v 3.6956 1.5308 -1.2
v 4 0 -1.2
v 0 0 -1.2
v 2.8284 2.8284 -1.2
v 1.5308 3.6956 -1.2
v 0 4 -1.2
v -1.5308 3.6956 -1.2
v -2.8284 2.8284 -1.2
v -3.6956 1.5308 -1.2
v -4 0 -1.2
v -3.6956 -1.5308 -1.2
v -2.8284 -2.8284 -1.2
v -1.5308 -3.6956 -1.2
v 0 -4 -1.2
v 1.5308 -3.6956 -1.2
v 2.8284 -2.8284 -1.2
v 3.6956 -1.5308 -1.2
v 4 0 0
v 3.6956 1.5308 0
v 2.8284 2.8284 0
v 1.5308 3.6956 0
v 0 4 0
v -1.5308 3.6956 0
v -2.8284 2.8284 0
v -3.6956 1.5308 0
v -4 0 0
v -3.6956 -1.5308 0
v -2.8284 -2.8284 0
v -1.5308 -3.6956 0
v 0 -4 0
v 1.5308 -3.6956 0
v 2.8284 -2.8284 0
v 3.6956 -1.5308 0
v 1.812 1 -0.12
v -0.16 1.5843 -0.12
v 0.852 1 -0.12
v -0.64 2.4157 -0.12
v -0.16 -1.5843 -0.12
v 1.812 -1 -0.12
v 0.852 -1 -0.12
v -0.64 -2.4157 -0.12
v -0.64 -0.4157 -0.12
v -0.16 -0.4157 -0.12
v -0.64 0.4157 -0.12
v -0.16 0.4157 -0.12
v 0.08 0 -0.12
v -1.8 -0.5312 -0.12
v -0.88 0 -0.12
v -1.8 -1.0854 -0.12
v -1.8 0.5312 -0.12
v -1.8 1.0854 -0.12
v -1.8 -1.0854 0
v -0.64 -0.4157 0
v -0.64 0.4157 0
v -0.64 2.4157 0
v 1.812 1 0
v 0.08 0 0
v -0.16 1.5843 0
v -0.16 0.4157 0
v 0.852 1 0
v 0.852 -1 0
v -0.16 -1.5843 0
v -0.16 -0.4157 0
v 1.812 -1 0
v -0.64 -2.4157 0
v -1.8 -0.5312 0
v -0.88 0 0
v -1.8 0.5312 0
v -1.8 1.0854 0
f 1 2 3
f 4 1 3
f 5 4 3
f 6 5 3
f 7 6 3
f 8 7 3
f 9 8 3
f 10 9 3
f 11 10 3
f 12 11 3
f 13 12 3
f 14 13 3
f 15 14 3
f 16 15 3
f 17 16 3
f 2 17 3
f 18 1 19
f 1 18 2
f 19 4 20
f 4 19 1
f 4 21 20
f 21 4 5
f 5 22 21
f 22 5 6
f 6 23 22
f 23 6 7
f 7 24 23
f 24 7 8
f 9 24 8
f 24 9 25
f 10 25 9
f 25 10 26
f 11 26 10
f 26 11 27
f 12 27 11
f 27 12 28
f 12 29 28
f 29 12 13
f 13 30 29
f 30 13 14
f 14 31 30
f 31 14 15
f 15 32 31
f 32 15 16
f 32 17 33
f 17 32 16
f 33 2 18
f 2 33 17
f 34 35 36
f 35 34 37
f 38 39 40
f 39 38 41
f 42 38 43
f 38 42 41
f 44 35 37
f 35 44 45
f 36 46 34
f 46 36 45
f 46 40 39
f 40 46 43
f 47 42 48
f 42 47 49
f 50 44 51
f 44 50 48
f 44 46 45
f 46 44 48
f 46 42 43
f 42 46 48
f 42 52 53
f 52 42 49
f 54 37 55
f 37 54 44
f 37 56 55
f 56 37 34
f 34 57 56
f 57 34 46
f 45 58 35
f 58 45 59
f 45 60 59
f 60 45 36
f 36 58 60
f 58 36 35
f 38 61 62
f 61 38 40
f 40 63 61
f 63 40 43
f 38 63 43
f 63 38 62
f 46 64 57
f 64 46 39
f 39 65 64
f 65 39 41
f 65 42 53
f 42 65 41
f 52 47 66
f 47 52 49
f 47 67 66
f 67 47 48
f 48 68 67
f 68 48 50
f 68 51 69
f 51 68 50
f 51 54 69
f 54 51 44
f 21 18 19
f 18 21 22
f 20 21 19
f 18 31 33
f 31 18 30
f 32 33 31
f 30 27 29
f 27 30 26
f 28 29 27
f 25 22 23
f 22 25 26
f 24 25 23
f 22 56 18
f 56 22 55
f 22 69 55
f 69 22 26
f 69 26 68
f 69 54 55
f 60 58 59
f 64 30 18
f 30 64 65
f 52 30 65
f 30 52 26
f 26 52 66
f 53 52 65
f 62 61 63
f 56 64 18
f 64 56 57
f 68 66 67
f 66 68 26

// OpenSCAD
// file: ../p/4-4edge.scad
use <../lib.scad>
function ldraw_lib__4_4edge() = [
// 0 Circle 1.0
// 0 Name: 4-4edge.dat
// 0 Author: James Jessiman
// 0 !LDRAW_ORG Primitive UPDATE 2017-01
// 0 !LICENSE Licensed under CC BY 2.0 and CC BY 4.0 : see CAreadme.txt
// 
// 0 BFC CERTIFY CCW
  [0,"BFC","CERTIFY"],
  [0,"BFC","CCW"],
// 
// 0 !HISTORY 1998-12-15 [PTadmin] Official Update 1998-10
// 0 !HISTORY 2005-12-28 [PTadmin] Official Update 2005-01
// 0 !HISTORY 2007-06-24 [PTadmin] Header formatted for Contributor Agreement
// 0 !HISTORY 2008-07-01 [PTadmin] Official Update 2008-01
// 0 !HISTORY 2017-01-15 [Steffen] BFCed
// 0 !HISTORY 2017-12-30 [PTadmin] Official Update 2017-01
// 
// 
// 2 24 1 0 0 0.9239 0 0.3827
  [2,24,1,0,0,0.9239,0,0.3827],
// 2 24 0.9239 0 0.3827 0.7071 0 0.7071
  [2,24,0.9239,0,0.3827,0.7071,0,0.7071],
// 2 24 0.7071 0 0.7071 0.3827 0 0.9239
  [2,24,0.7071,0,0.7071,0.3827,0,0.9239],
// 2 24 0.3827 0 0.9239 0 0 1
  [2,24,0.3827,0,0.9239,0,0,1],
// 2 24 0 0 1 -0.3827 0 0.9239
  [2,24,0,0,1,-0.3827,0,0.9239],
// 2 24 -0.3827 0 0.9239 -0.7071 0 0.7071
  [2,24,-0.3827,0,0.9239,-0.7071,0,0.7071],
// 2 24 -0.7071 0 0.7071 -0.9239 0 0.3827
  [2,24,-0.7071,0,0.7071,-0.9239,0,0.3827],
// 2 24 -0.9239 0 0.3827 -1 0 -0
  [2,24,-0.9239,0,0.3827,-1,0,-0],
// 2 24 -1 0 -0 -0.9239 0 -0.3827
  [2,24,-1,0,-0,-0.9239,0,-0.3827],
// 2 24 -0.9239 0 -0.3827 -0.7071 0 -0.7071
  [2,24,-0.9239,0,-0.3827,-0.7071,0,-0.7071],
// 2 24 -0.7071 0 -0.7071 -0.3827 0 -0.9239
  [2,24,-0.7071,0,-0.7071,-0.3827,0,-0.9239],
// 2 24 -0.3827 0 -0.9239 0 0 -1
  [2,24,-0.3827,0,-0.9239,0,0,-1],
// 2 24 0 0 -1 0.3827 0 -0.9239
  [2,24,0,0,-1,0.3827,0,-0.9239],
// 2 24 0.3827 0 -0.9239 0.7071 0 -0.7071
  [2,24,0.3827,0,-0.9239,0.7071,0,-0.7071],
// 2 24 0.7071 0 -0.7071 0.9239 0 -0.3827
  [2,24,0.7071,0,-0.7071,0.9239,0,-0.3827],
// 2 24 0.9239 0 -0.3827 1 0 0
  [2,24,0.9239,0,-0.3827,1,0,0],
];
makepoly(ldraw_lib__4_4edge(), line=0.2);
// file: ../p/4-4disc.scad
use <../lib.scad>
function ldraw_lib__4_4disc() = [
// 0 Disc 1.0
// 0 Name: 4-4disc.dat
// 0 Author: James Jessiman
// 0 !LDRAW_ORG Primitive UPDATE 2002-02
// 0 !LICENSE Licensed under CC BY 2.0 and CC BY 4.0 : see CAreadme.txt
// 
// 0 BFC CERTIFY CCW
  [0,"BFC","CERTIFY"],
  [0,"BFC","CCW"],
// 
// 0 !HISTORY 1998-12-15 [PTadmin] Official Update 1998-10
// 0 !HISTORY 2002-03-23 [sbliss] Added BFC statement
// 0 !HISTORY 2002-04-25 [PTadmin] Official Update 2002-02
// 0 !HISTORY 2007-06-24 [PTadmin] Header formatted for Contributor Agreement
// 0 !HISTORY 2008-07-01 [PTadmin] Official Update 2008-01
// 
// 
// 3 16 0 0 0 1 0 0 0.9239 0 0.3827
  [3,16,0,0,0,1,0,0,0.9239,0,0.3827],
// 3 16 0 0 0 0.9239 0 0.3827 0.7071 0 0.7071
  [3,16,0,0,0,0.9239,0,0.3827,0.7071,0,0.7071],
// 3 16 0 0 0 0.7071 0 0.7071 0.3827 0 0.9239
  [3,16,0,0,0,0.7071,0,0.7071,0.3827,0,0.9239],
// 3 16 0 0 0 0.3827 0 0.9239 0 0 1
  [3,16,0,0,0,0.3827,0,0.9239,0,0,1],
// 3 16 0 0 0 0 0 1 -0.3827 0 0.9239
  [3,16,0,0,0,0,0,1,-0.3827,0,0.9239],
// 3 16 0 0 0 -0.3827 0 0.9239 -0.7071 0 0.7071
  [3,16,0,0,0,-0.3827,0,0.9239,-0.7071,0,0.7071],
// 3 16 0 0 0 -0.7071 0 0.7071 -0.9239 0 0.3827
  [3,16,0,0,0,-0.7071,0,0.7071,-0.9239,0,0.3827],
// 3 16 0 0 0 -0.9239 0 0.3827 -1 0 -0
  [3,16,0,0,0,-0.9239,0,0.3827,-1,0,-0],
// 3 16 0 0 0 -1 0 -0 -0.9239 0 -0.3827
  [3,16,0,0,0,-1,0,-0,-0.9239,0,-0.3827],
// 3 16 0 0 0 -0.9239 0 -0.3827 -0.7071 0 -0.7071
  [3,16,0,0,0,-0.9239,0,-0.3827,-0.7071,0,-0.7071],
// 3 16 0 0 0 -0.7071 0 -0.7071 -0.3827 0 -0.9239
  [3,16,0,0,0,-0.7071,0,-0.7071,-0.3827,0,-0.9239],
// 3 16 0 0 0 -0.3827 0 -0.9239 0 0 -1
  [3,16,0,0,0,-0.3827,0,-0.9239,0,0,-1],
// 3 16 0 0 0 0 0 -1 0.3827 0 -0.9239
  [3,16,0,0,0,0,0,-1,0.3827,0,-0.9239],
// 3 16 0 0 0 0.3827 0 -0.9239 0.7071 0 -0.7071
  [3,16,0,0,0,0.3827,0,-0.9239,0.7071,0,-0.7071],
// 3 16 0 0 0 0.7071 0 -0.7071 0.9239 0 -0.3827
  [3,16,0,0,0,0.7071,0,-0.7071,0.9239,0,-0.3827],
// 3 16 0 0 0 0.9239 0 -0.3827 1 0 0
  [3,16,0,0,0,0.9239,0,-0.3827,1,0,0],
// 0
];
makepoly(ldraw_lib__4_4disc(), line=0.2);
// file: ../p/4-4cyli.scad
use <../lib.scad>
function ldraw_lib__4_4cyli() = [
// 0 Cylinder 1.0
// 0 Name: 4-4cyli.dat
// 0 Author: James Jessiman
// 0 !LDRAW_ORG Primitive UPDATE 2005-01
// 0 !LICENSE Licensed under CC BY 2.0 and CC BY 4.0 : see CAreadme.txt
// 
// 0 BFC CERTIFY CCW
  [0,"BFC","CERTIFY"],
  [0,"BFC","CCW"],
// 
// 0 !HISTORY 1998-12-15 [PTadmin] Official Update 1998-10
// 0 !HISTORY 2002-03-23 [sbliss] Added BFC statement; merged headers from files in distributions LDraw 0.27 and Complete.
// 0 !HISTORY 2002-04-25 [PTadmin] Official Update 2002-02
// 0 !HISTORY 2004-12-14 [guyvivan] BFC CCW
// 0 !HISTORY 2005-12-28 [PTadmin] Official Update 2005-01
// 0 !HISTORY 2007-06-24 [PTadmin] Header formatted for Contributor Agreement
// 0 !HISTORY 2008-07-01 [PTadmin] Official Update 2008-01
// 
// 
// 4 16 1 1 0 0.9239 1 0.3827 0.9239 0 0.3827 1 0 0
  [4,16,1,1,0,0.9239,1,0.3827,0.9239,0,0.3827,1,0,0],
// 5 24 1 0 0 1 1 0 0.9239 0 0.3827 0.9239 0 -0.3827
  [5,24,1,0,0,1,1,0,0.9239,0,0.3827,0.9239,0,-0.3827],
// 4 16 0.9239 1 0.3827 0.7071 1 0.7071 0.7071 0 0.7071 0.9239 0 0.3827
  [4,16,0.9239,1,0.3827,0.7071,1,0.7071,0.7071,0,0.7071,0.9239,0,0.3827],
// 5 24 0.9239 0 0.3827 0.9239 1 0.3827 0.7071 0 0.7071 1 0 0
  [5,24,0.9239,0,0.3827,0.9239,1,0.3827,0.7071,0,0.7071,1,0,0],
// 4 16 0.7071 1 0.7071 0.3827 1 0.9239 0.3827 0 0.9239 0.7071 0 0.7071
  [4,16,0.7071,1,0.7071,0.3827,1,0.9239,0.3827,0,0.9239,0.7071,0,0.7071],
// 5 24 0.7071 0 0.7071 0.7071 1 0.7071 0.3827 0 0.9239 0.9239 0 0.3827
  [5,24,0.7071,0,0.7071,0.7071,1,0.7071,0.3827,0,0.9239,0.9239,0,0.3827],
// 4 16 0.3827 1 0.9239 0 1 1 0 0 1 0.3827 0 0.9239
  [4,16,0.3827,1,0.9239,0,1,1,0,0,1,0.3827,0,0.9239],
// 5 24 0.3827 0 0.9239 0.3827 1 0.9239 0 0 1 0.7071 0 0.7071
  [5,24,0.3827,0,0.9239,0.3827,1,0.9239,0,0,1,0.7071,0,0.7071],
// 4 16 0 1 1 -0.3827 1 0.9239 -0.3827 0 0.9239 0 0 1
  [4,16,0,1,1,-0.3827,1,0.9239,-0.3827,0,0.9239,0,0,1],
// 5 24 0 0 1 0 1 1 -0.3827 0 0.9239 0.3827 0 0.9239
  [5,24,0,0,1,0,1,1,-0.3827,0,0.9239,0.3827,0,0.9239],
// 4 16 -0.3827 1 0.9239 -0.7071 1 0.7071 -0.7071 0 0.7071 -0.3827 0 0.9239
  [4,16,-0.3827,1,0.9239,-0.7071,1,0.7071,-0.7071,0,0.7071,-0.3827,0,0.9239],
// 5 24 -0.3827 0 0.9239 -0.3827 1 0.9239 -0.7071 0 0.7071 0 0 1
  [5,24,-0.3827,0,0.9239,-0.3827,1,0.9239,-0.7071,0,0.7071,0,0,1],
// 4 16 -0.7071 1 0.7071 -0.9239 1 0.3827 -0.9239 0 0.3827 -0.7071 0 0.7071
  [4,16,-0.7071,1,0.7071,-0.9239,1,0.3827,-0.9239,0,0.3827,-0.7071,0,0.7071],
// 5 24 -0.7071 0 0.7071 -0.7071 1 0.7071 -0.9239 0 0.3827 -0.3827 0 0.9239
  [5,24,-0.7071,0,0.7071,-0.7071,1,0.7071,-0.9239,0,0.3827,-0.3827,0,0.9239],
// 4 16 -0.9239 1 0.3827 -1 1 0 -1 0 0 -0.9239 0 0.3827
  [4,16,-0.9239,1,0.3827,-1,1,0,-1,0,0,-0.9239,0,0.3827],
// 5 24 -0.9239 0 0.3827 -0.9239 1 0.3827 -1 0 0 -0.7071 0 0.7071
  [5,24,-0.9239,0,0.3827,-0.9239,1,0.3827,-1,0,0,-0.7071,0,0.7071],
// 4 16 -1 1 0 -0.9239 1 -0.3827 -0.9239 0 -0.3827 -1 0 0
  [4,16,-1,1,0,-0.9239,1,-0.3827,-0.9239,0,-0.3827,-1,0,0],
// 5 24 -1 0 0 -1 1 0 -0.9239 0 -0.3827 -0.9239 0 0.3827
  [5,24,-1,0,0,-1,1,0,-0.9239,0,-0.3827,-0.9239,0,0.3827],
// 4 16 -0.9239 1 -0.3827 -0.7071 1 -0.7071 -0.7071 0 -0.7071 -0.9239 0 -0.3827
  [4,16,-0.9239,1,-0.3827,-0.7071,1,-0.7071,-0.7071,0,-0.7071,-0.9239,0,-0.3827],
// 5 24 -0.9239 0 -0.3827 -0.9239 1 -0.3827 -0.7071 0 -0.7071 -1 0 0
  [5,24,-0.9239,0,-0.3827,-0.9239,1,-0.3827,-0.7071,0,-0.7071,-1,0,0],
// 4 16 -0.7071 1 -0.7071 -0.3827 1 -0.9239 -0.3827 0 -0.9239 -0.7071 0 -0.7071
  [4,16,-0.7071,1,-0.7071,-0.3827,1,-0.9239,-0.3827,0,-0.9239,-0.7071,0,-0.7071],
// 5 24 -0.7071 0 -0.7071 -0.7071 1 -0.7071 -0.3827 0 -0.9239 -0.9239 0 -0.3827
  [5,24,-0.7071,0,-0.7071,-0.7071,1,-0.7071,-0.3827,0,-0.9239,-0.9239,0,-0.3827],
// 4 16 -0.3827 1 -0.9239 0 1 -1 0 0 -1 -0.3827 0 -0.9239
  [4,16,-0.3827,1,-0.9239,0,1,-1,0,0,-1,-0.3827,0,-0.9239],
// 5 24 -0.3827 0 -0.9239 -0.3827 1 -0.9239 0 0 -1 -0.7071 0 -0.7071
  [5,24,-0.3827,0,-0.9239,-0.3827,1,-0.9239,0,0,-1,-0.7071,0,-0.7071],
// 4 16 0 1 -1 0.3827 1 -0.9239 0.3827 0 -0.9239 0 0 -1
  [4,16,0,1,-1,0.3827,1,-0.9239,0.3827,0,-0.9239,0,0,-1],
// 5 24 0 0 -1 0 1 -1 0.3827 0 -0.9239 -0.3827 0 -0.9239
  [5,24,0,0,-1,0,1,-1,0.3827,0,-0.9239,-0.3827,0,-0.9239],
// 4 16 0.3827 1 -0.9239 0.7071 1 -0.7071 0.7071 0 -0.7071 0.3827 0 -0.9239
  [4,16,0.3827,1,-0.9239,0.7071,1,-0.7071,0.7071,0,-0.7071,0.3827,0,-0.9239],
// 5 24 0.3827 0 -0.9239 0.3827 1 -0.9239 0.7071 0 -0.7071 0 0 -1
  [5,24,0.3827,0,-0.9239,0.3827,1,-0.9239,0.7071,0,-0.7071,0,0,-1],
// 4 16 0.7071 1 -0.7071 0.9239 1 -0.3827 0.9239 0 -0.3827 0.7071 0 -0.7071
  [4,16,0.7071,1,-0.7071,0.9239,1,-0.3827,0.9239,0,-0.3827,0.7071,0,-0.7071],
// 5 24 0.7071 0 -0.7071 0.7071 1 -0.7071 0.9239 0 -0.3827 0.3827 0 -0.9239
  [5,24,0.7071,0,-0.7071,0.7071,1,-0.7071,0.9239,0,-0.3827,0.3827,0,-0.9239],
// 4 16 0.9239 1 -0.3827 1 1 0 1 0 0 0.9239 0 -0.3827
  [4,16,0.9239,1,-0.3827,1,1,0,1,0,0,0.9239,0,-0.3827],
// 5 24 0.9239 0 -0.3827 0.9239 1 -0.3827 1 0 0 0.7071 0 -0.7071
  [5,24,0.9239,0,-0.3827,0.9239,1,-0.3827,1,0,0,0.7071,0,-0.7071],
// 0
];
makepoly(ldraw_lib__4_4cyli(), line=0.2);
// file: ../p/rect3.scad
use <../lib.scad>
function ldraw_lib__rect3() = [
// 0 Rectangle with 3 Edges
// 0 Name: rect3.dat
// 0 Author: Mark Kennedy [mkennedy]
// 0 !LDRAW_ORG Primitive UPDATE 2010-01
// 0 !LICENSE Licensed under CC BY 2.0 and CC BY 4.0 : see CAreadme.txt
// 
// 0 BFC CERTIFY CCW
  [0,"BFC","CERTIFY"],
  [0,"BFC","CCW"],
// 
// 0 !HISTORY 2003-08-01 [PTadmin] Official Update 2003-02
// 0 !HISTORY 2007-06-24 [PTadmin] Header formatted for Contributor Agreement
// 0 !HISTORY 2008-07-01 [PTadmin] Official Update 2008-01
// 0 !HISTORY 2010-01-17 [mikeheide] Change winding to CCW
// 0 !HISTORY 2010-04-05 [PTadmin] Official Update 2010-01
// 
// 
// 2 24 1 0 1 -1 0 1
  [2,24,1,0,1,-1,0,1],
// 2 24 1 0 1 1 0 -1
  [2,24,1,0,1,1,0,-1],
// 2 24 -1 0 1 -1 0 -1
  [2,24,-1,0,1,-1,0,-1],
// 4 16 -1 0 1 -1 0 -1 1 0 -1 1 0 1
  [4,16,-1,0,1,-1,0,-1,1,0,-1,1,0,1],
// 0 //
];
makepoly(ldraw_lib__rect3(), line=0.2);
// file: ../p/rect2p.scad
use <../lib.scad>
function ldraw_lib__rect2p() = [
// 0 Rectangle with 2 Parallel Edges
// 0 Name: rect2p.dat
// 0 Author: Donald Sutter [technog]
// 0 !LDRAW_ORG Primitive UPDATE 2010-01
// 0 !LICENSE Licensed under CC BY 2.0 and CC BY 4.0 : see CAreadme.txt
// 
// 0 BFC CERTIFY CCW
  [0,"BFC","CERTIFY"],
  [0,"BFC","CCW"],
// 
// 0 !HISTORY 2003-08-01 [PTadmin] Official Update 2003-02
// 0 !HISTORY 2007-06-24 [PTadmin] Header formatted for Contributor Agreement
// 0 !HISTORY 2008-07-01 [PTadmin] Official Update 2008-01
// 0 !HISTORY 2010-01-17 [mikeheide] changed winding to CCW
// 0 !HISTORY 2010-04-05 [PTadmin] Official Update 2010-01
// 
// 
// 2 24 1 0 1 -1 0 1
  [2,24,1,0,1,-1,0,1],
// 2 24 -1 0 -1 1 0 -1
  [2,24,-1,0,-1,1,0,-1],
// 4 16 -1 0 1 -1 0 -1 1 0 -1 1 0 1
  [4,16,-1,0,1,-1,0,-1,1,0,-1,1,0,1],
// 0
];
makepoly(ldraw_lib__rect2p(), line=0.2);
// file: ../p/rect.scad
use <../lib.scad>
function ldraw_lib__rect() = [
// 0 Rectangle
// 0 Name: rect.dat
// 0 Author: James Jessiman
// 0 !LDRAW_ORG Primitive UPDATE 2010-01
// 0 !LICENSE Licensed under CC BY 2.0 and CC BY 4.0 : see CAreadme.txt
// 
// 0 BFC CERTIFY CCW
  [0,"BFC","CERTIFY"],
  [0,"BFC","CCW"],
// 
// 0 !HISTORY 2002-04-05 [hafhead] Added BFC statement
// 0 !HISTORY 2002-04-25 [PTadmin] Official Update 2002-02
// 0 !HISTORY 2007-06-24 [PTadmin] Header formatted for Contributor Agreement
// 0 !HISTORY 2008-07-01 [PTadmin] Official Update 2008-01
// 0 !HISTORY 2010-01-17 [mikeheide] changed winding to CCW
// 0 !HISTORY 2010-04-05 [PTadmin] Official Update 2010-01
// 
// 
// 2 24 1 0 1 -1 0 1
  [2,24,1,0,1,-1,0,1],
// 2 24 -1 0 1 -1 0 -1
  [2,24,-1,0,1,-1,0,-1],
// 2 24 -1 0 -1 1 0 -1
  [2,24,-1,0,-1,1,0,-1],
// 2 24 1 0 -1 1 0 1
  [2,24,1,0,-1,1,0,1],
// 4 16 -1 0 1 -1 0 -1 1 0 -1 1 0 1
  [4,16,-1,0,1,-1,0,-1,1,0,-1,1,0,1],
// 0
];
makepoly(ldraw_lib__rect(), line=0.2);
// file: ../p/4-4cylc.scad
use <../lib.scad>
use <4-4cyli.scad>
use <4-4disc.scad>
use <4-4edge.scad>
function ldraw_lib__4_4cylc() = [
// 0 Cylinder Closed 1.0
// 0 Name: 4-4cylc.dat
// 0 Author: Alex Taylor [anathema]
// 0 !LDRAW_ORG Primitive UPDATE 2009-02
// 0 !LICENSE Licensed under CC BY 2.0 and CC BY 4.0 : see CAreadme.txt
// 
// 0 BFC CERTIFY CCW
  [0,"BFC","CERTIFY"],
  [0,"BFC","CCW"],
// 
// 0 !HISTORY 2008-12-29 [cwdee] Removed one disc
// 0 !HISTORY 2009-09-03 [PTadmin] Official Update 2009-02
// 
// 
// 1 16 0 0 0 1 0 0 0 1 0 0 0 1 4-4edge.dat
  [1,16,0,0,0,1,0,0,0,1,0,0,0,1, ldraw_lib__4_4edge()],
// 1 16 0 1 0 1 0 0 0 1 0 0 0 1 4-4edge.dat
  [1,16,0,1,0,1,0,0,0,1,0,0,0,1, ldraw_lib__4_4edge()],
// 1 16 0 0 0 1 0 0 0 1 0 0 0 1 4-4disc.dat
  [1,16,0,0,0,1,0,0,0,1,0,0,0,1, ldraw_lib__4_4disc()],
// 1 16 0 0 0 1 0 0 0 1 0 0 0 1 4-4cyli.dat
  [1,16,0,0,0,1,0,0,0,1,0,0,0,1, ldraw_lib__4_4cyli()],
// 0
];
makepoly(ldraw_lib__4_4cylc(), line=0.2);
// file: ../p/1-4chrd.scad
use <../lib.scad>
function ldraw_lib__1_4chrd() = [
// 0 Chord 0.25
// 0 Name: 1-4chrd.dat
// 0 Author: Tony Hafner [hafhead]
// 0 !LDRAW_ORG Primitive UPDATE 2012-02
// 0 !LICENSE Licensed under CC BY 2.0 and CC BY 4.0 : see CAreadme.txt
// 
// 0 BFC CERTIFY CCW
  [0,"BFC","CERTIFY"],
  [0,"BFC","CCW"],
// 
// 0 !HISTORY 2004-04-22 [PTadmin] Official Update 2004-02
// 0 !HISTORY 2007-10-09 [PTadmin] Header formatted for Contributor Agreement
// 0 !HISTORY 2008-07-01 [PTadmin] Official Update 2008-01
// 0 !HISTORY 2012-08-02 [MMR1988] Re-creation with PrimGen2 and Rectifier
// 0 !HISTORY 2012-08-09 [PTadmin] Official Update 2012-02
// 
// 
// 4 16 0.9239 0 0.3827 0.3827 0 0.9239 0 0 1 1 0 0
  [4,16,0.9239,0,0.3827,0.3827,0,0.9239,0,0,1,1,0,0],
// 3 16 0.7071 0 0.7071 0.3827 0 0.9239 0.9239 0 0.3827
  [3,16,0.7071,0,0.7071,0.3827,0,0.9239,0.9239,0,0.3827],
];
makepoly(ldraw_lib__1_4chrd(), line=0.2);
// main file
use <../lib.scad>
use <../p/1-4chrd.scad>
use <../p/4-4cylc.scad>
use <../p/rect.scad>
use <../p/rect2p.scad>
use <../p/rect3.scad>
function ldraw_lib__u9398() = [
// 0 ~Electric Powered Up 6 Port Hub Bluetooth Button
// 0 Name: u9398.dat
// 0 Author: Philippe Hurbain [Philo]
// 0 !LDRAW_ORG Part UPDATE 2020-03
// 0 !LICENSE Licensed under CC BY 2.0 and CC BY 4.0 : see CAreadme.txt
// 
// 0 BFC CERTIFY CCW
  [0,"BFC","CERTIFY"],
  [0,"BFC","CCW"],
// 
// 0 !KEYWORDS Mindstorms, Robot Inventor, Spike Prime
// 
// 0 !HISTORY 2019-12-27 [PTadmin] Official Update 2019-03
// 0 !HISTORY 2020-12-27 [PTadmin] Update description
// 0 !HISTORY 2020-12-29 [PTadmin] Official Update 2020-03
// 
// 
// 1 16 0 3 0 10 0 0 0 -3 0 0 0 10 4-4cylc.dat
  [1,16,0,3,0,10,0,0,0,-3,0,0,0,10, ldraw_lib__4_4cylc()],
// 4 16 -1.6 0.3 6.0392 -0.4 0.3 3.9608 2.1301 0.3 2.5 4.5301 0.3 2.5
  [4,16,-1.6,0.3,6.0392,-0.4,0.3,3.9608,2.1301,0.3,2.5,4.5301,0.3,2.5],
// 4 16 2.1301 0.3 -2.5 -0.4 0.3 -3.9608 -1.6 0.3 -6.0392 4.5301 0.3 -2.5
  [4,16,2.1301,0.3,-2.5,-0.4,0.3,-3.9608,-1.6,0.3,-6.0392,4.5301,0.3,-2.5],
// 4 16 -1.6 0.3 -1.0392 -1.6 0.3 -6.0392 -0.4 0.3 -3.9608 -0.4 0.3 -1.0392
  [4,16,-1.6,0.3,-1.0392,-1.6,0.3,-6.0392,-0.4,0.3,-3.9608,-0.4,0.3,-1.0392],
// 4 16 -1.6 0.3 6.0392 -1.6 0.3 1.0392 -0.4 0.3 1.0392 -0.4 0.3 3.9608
  [4,16,-1.6,0.3,6.0392,-1.6,0.3,1.0392,-0.4,0.3,1.0392,-0.4,0.3,3.9608],
// 4 16 2.1301 0.3 2.5 -0.4 0.3 1.0392 0.2 0.3 0 4.5301 0.3 2.5
  [4,16,2.1301,0.3,2.5,-0.4,0.3,1.0392,0.2,0.3,0,4.5301,0.3,2.5],
// 4 16 0.2 0.3 0 -0.4 0.3 -1.0392 2.1301 0.3 -2.5 4.5301 0.3 -2.5
  [4,16,0.2,0.3,0,-0.4,0.3,-1.0392,2.1301,0.3,-2.5,4.5301,0.3,-2.5],
// 4 16 -2.2 0.3 0 -4.5 0.3 -1.3279 -4.5 0.3 -2.7135 -1.6 0.3 -1.0392
  [4,16,-2.2,0.3,0,-4.5,0.3,-1.3279,-4.5,0.3,-2.7135,-1.6,0.3,-1.0392],
// 4 16 -4.5 0.3 2.7135 -4.5 0.3 1.3279 -2.2 0.3 0 -1.6 0.3 1.0392
  [4,16,-4.5,0.3,2.7135,-4.5,0.3,1.3279,-2.2,0.3,0,-1.6,0.3,1.0392],
// 4 16 -0.4 0.3 1.0392 -1.6 0.3 1.0392 -2.2 0.3 0 0.2 0.3 0
  [4,16,-0.4,0.3,1.0392,-1.6,0.3,1.0392,-2.2,0.3,0,0.2,0.3,0],
// 4 16 -2.2 0.3 0 -1.6 0.3 -1.0392 -0.4 0.3 -1.0392 0.2 0.3 0
  [4,16,-2.2,0.3,0,-1.6,0.3,-1.0392,-0.4,0.3,-1.0392,0.2,0.3,0],
// 1 16 -3.05 0.15 -1.87635 0 0 1.45 -0.15 0 0 0 -1 0.83715 rect.dat
  [1,16,-3.05,0.15,-1.87635,0,0,1.45,-0.15,0,0,0,-1,0.83715, ldraw_lib__rect()],
// 1 16 -1.6 0.15 3.5392 0 -1 0 0.15 0 0 0 0 2.5 rect.dat
  [1,16,-1.6,0.15,3.5392,0,-1,0,0.15,0,0,0,0,2.5, ldraw_lib__rect()],
// 1 16 1.46505 0.15 4.2696 0 0 3.06505 0.15 0 0 0 1 -1.7696 rect3.dat
  [1,16,1.46505,0.15,4.2696,0,0,3.06505,0.15,0,0,0,1,-1.7696, ldraw_lib__rect3()],
// 1 16 2.36505 0.15 1.25 0 0 -2.16505 0.15 0 0 0 -1 -1.25 rect3.dat
  [1,16,2.36505,0.15,1.25,0,0,-2.16505,0.15,0,0,0,-1,-1.25, ldraw_lib__rect3()],
// 1 16 -0.4 0.15 2.5 0 1 0 0.15 0 0 0 0 -1.4608 rect.dat
  [1,16,-0.4,0.15,2.5,0,1,0,0.15,0,0,0,0,-1.4608, ldraw_lib__rect()],
// 1 16 0.86505 0.15 1.7696 0 0 1.26505 0.15 0 0 0 1 0.7304 rect3.dat
  [1,16,0.86505,0.15,1.7696,0,0,1.26505,0.15,0,0,0,1,0.7304, ldraw_lib__rect3()],
// 1 16 0.86505 0.15 3.2304 -1.26505 0 0 0 0 -0.15 0.7304 -1 0 rect2p.dat
  [1,16,0.86505,0.15,3.2304,-1.26505,0,0,0,0,-0.15,0.7304,-1,0, ldraw_lib__rect2p()],
// 1 16 0.86505 0.15 -3.2304 0 0 1.26505 0.15 0 0 0 1 0.7304 rect.dat
  [1,16,0.86505,0.15,-3.2304,0,0,1.26505,0.15,0,0,0,1,0.7304, ldraw_lib__rect()],
// 1 16 0.86505 0.15 -1.7696 0 0 -1.26505 0.15 0 0 0 -1 0.7304 rect3.dat
  [1,16,0.86505,0.15,-1.7696,0,0,-1.26505,0.15,0,0,0,-1,0.7304, ldraw_lib__rect3()],
// 1 16 -0.4 0.15 -2.5 0 1 0 0 0 -0.15 -1.4608 0 0 rect2p.dat
  [1,16,-0.4,0.15,-2.5,0,1,0,0,0,-0.15,-1.4608,0,0, ldraw_lib__rect2p()],
// 1 16 2.36505 0.15 -1.25 0 0 2.16505 0.15 0 0 0 1 -1.25 rect3.dat
  [1,16,2.36505,0.15,-1.25,0,0,2.16505,0.15,0,0,0,1,-1.25, ldraw_lib__rect3()],
// 1 16 1.46505 0.15 -4.2696 0 0 -3.06505 0.15 0 0 0 -1 -1.7696 rect3.dat
  [1,16,1.46505,0.15,-4.2696,0,0,-3.06505,0.15,0,0,0,-1,-1.7696, ldraw_lib__rect3()],
// 1 16 -1.6 0.15 -3.5392 0 -1 0 0 0 -0.15 2.5 0 0 rect2p.dat
  [1,16,-1.6,0.15,-3.5392,0,-1,0,0,0,-0.15,2.5,0,0, ldraw_lib__rect2p()],
// 1 16 -4.5 0.15 -2.0207 0 -1 0 0.15 0 0 0 0 0.6928 rect3.dat
  [1,16,-4.5,0.15,-2.0207,0,-1,0,0.15,0,0,0,0,0.6928, ldraw_lib__rect3()],
// 1 16 -3.35 0.15 -0.66395 0 0 1.15 0.15 0 0 0 1 0.66395 rect3.dat
  [1,16,-3.35,0.15,-0.66395,0,0,1.15,0.15,0,0,0,1,0.66395, ldraw_lib__rect3()],
// 1 16 -3.35 0.15 0.66395 0 0 -1.15 0.15 0 0 0 -1 0.66395 rect3.dat
  [1,16,-3.35,0.15,0.66395,0,0,-1.15,0.15,0,0,0,-1,0.66395, ldraw_lib__rect3()],
// 1 16 -4.5 0.15 2.0207 0 -1 0 0.15 0 0 0 0 0.6928 rect3.dat
  [1,16,-4.5,0.15,2.0207,0,-1,0,0.15,0,0,0,0,0.6928, ldraw_lib__rect3()],
// 1 16 -3.05 0.15 1.87635 1.45 0 0 0 0 -0.15 -0.83715 1 0 rect2p.dat
  [1,16,-3.05,0.15,1.87635,1.45,0,0,0,0,-0.15,-0.83715,1,0, ldraw_lib__rect2p()],
// 1 16 0 0 0 10 0 0 0 3 0 0 0 10 1-4chrd.dat
  [1,16,0,0,0,10,0,0,0,3,0,0,0,10, ldraw_lib__1_4chrd()],
// 1 16 0 0 0 0 0 10 0 3 0 -10 0 0 1-4chrd.dat
  [1,16,0,0,0,0,0,10,0,3,0,-10,0,0, ldraw_lib__1_4chrd()],
// 1 16 0 0 0 -10 0 0 0 3 0 0 0 -10 1-4chrd.dat
  [1,16,0,0,0,-10,0,0,0,3,0,0,0,-10, ldraw_lib__1_4chrd()],
// 1 16 0 0 0 0 0 -10 0 3 0 10 0 0 1-4chrd.dat
  [1,16,0,0,0,0,0,-10,0,3,0,10,0,0, ldraw_lib__1_4chrd()],
// 4 16 0 0 10 -1.6 0 6.0392 4.5301 0 2.5 10 0 0
  [4,16,0,0,10,-1.6,0,6.0392,4.5301,0,2.5,10,0,0],
// 4 16 -4.5 0 2.7135 -1.6 0 6.0392 0 0 10 -10 0 0
  [4,16,-4.5,0,2.7135,-1.6,0,6.0392,0,0,10,-10,0,0],
// 3 16 -4.5 0 2.7135 -10 0 0 -4.5 0 1.3279
  [3,16,-4.5,0,2.7135,-10,0,0,-4.5,0,1.3279],
// 3 16 -4.5 0 2.7135 -1.6 0 1.0392 -1.6 0 6.0392
  [3,16,-4.5,0,2.7135,-1.6,0,1.0392,-1.6,0,6.0392],
// 3 16 2.1301 0 2.5 -0.4 0 3.9608 -0.4 0 1.0392
  [3,16,2.1301,0,2.5,-0.4,0,3.9608,-0.4,0,1.0392],
// 4 16 4.5301 0 -2.5 -1.6 0 -6.0392 0 0 -10 10 0 0
  [4,16,4.5301,0,-2.5,-1.6,0,-6.0392,0,0,-10,10,0,0],
// 4 16 0 0 -10 -1.6 0 -6.0392 -4.5 0 -2.7135 -10 0 0
  [4,16,0,0,-10,-1.6,0,-6.0392,-4.5,0,-2.7135,-10,0,0],
// 3 16 -10 0 0 -4.5 0 -2.7135 -4.5 0 -1.3279
  [3,16,-10,0,0,-4.5,0,-2.7135,-4.5,0,-1.3279],
// 3 16 -1.6 0 -1.0392 -4.5 0 -2.7135 -1.6 0 -6.0392
  [3,16,-1.6,0,-1.0392,-4.5,0,-2.7135,-1.6,0,-6.0392],
// 3 16 -0.4 0 -3.9608 2.1301 0 -2.5 -0.4 0 -1.0392
  [3,16,-0.4,0,-3.9608,2.1301,0,-2.5,-0.4,0,-1.0392],
// 4 16 10 0 0 4.5301 0 2.5 0.2 0 0 4.5301 0 -2.5
  [4,16,10,0,0,4.5301,0,2.5,0.2,0,0,4.5301,0,-2.5],
// 4 16 -4.5 0 -1.3279 -2.2 0 0 -4.5 0 1.3279 -10 0 0
  [4,16,-4.5,0,-1.3279,-2.2,0,0,-4.5,0,1.3279,-10,0,0],
];
makepoly(ldraw_lib__u9398(), line=0.2);
